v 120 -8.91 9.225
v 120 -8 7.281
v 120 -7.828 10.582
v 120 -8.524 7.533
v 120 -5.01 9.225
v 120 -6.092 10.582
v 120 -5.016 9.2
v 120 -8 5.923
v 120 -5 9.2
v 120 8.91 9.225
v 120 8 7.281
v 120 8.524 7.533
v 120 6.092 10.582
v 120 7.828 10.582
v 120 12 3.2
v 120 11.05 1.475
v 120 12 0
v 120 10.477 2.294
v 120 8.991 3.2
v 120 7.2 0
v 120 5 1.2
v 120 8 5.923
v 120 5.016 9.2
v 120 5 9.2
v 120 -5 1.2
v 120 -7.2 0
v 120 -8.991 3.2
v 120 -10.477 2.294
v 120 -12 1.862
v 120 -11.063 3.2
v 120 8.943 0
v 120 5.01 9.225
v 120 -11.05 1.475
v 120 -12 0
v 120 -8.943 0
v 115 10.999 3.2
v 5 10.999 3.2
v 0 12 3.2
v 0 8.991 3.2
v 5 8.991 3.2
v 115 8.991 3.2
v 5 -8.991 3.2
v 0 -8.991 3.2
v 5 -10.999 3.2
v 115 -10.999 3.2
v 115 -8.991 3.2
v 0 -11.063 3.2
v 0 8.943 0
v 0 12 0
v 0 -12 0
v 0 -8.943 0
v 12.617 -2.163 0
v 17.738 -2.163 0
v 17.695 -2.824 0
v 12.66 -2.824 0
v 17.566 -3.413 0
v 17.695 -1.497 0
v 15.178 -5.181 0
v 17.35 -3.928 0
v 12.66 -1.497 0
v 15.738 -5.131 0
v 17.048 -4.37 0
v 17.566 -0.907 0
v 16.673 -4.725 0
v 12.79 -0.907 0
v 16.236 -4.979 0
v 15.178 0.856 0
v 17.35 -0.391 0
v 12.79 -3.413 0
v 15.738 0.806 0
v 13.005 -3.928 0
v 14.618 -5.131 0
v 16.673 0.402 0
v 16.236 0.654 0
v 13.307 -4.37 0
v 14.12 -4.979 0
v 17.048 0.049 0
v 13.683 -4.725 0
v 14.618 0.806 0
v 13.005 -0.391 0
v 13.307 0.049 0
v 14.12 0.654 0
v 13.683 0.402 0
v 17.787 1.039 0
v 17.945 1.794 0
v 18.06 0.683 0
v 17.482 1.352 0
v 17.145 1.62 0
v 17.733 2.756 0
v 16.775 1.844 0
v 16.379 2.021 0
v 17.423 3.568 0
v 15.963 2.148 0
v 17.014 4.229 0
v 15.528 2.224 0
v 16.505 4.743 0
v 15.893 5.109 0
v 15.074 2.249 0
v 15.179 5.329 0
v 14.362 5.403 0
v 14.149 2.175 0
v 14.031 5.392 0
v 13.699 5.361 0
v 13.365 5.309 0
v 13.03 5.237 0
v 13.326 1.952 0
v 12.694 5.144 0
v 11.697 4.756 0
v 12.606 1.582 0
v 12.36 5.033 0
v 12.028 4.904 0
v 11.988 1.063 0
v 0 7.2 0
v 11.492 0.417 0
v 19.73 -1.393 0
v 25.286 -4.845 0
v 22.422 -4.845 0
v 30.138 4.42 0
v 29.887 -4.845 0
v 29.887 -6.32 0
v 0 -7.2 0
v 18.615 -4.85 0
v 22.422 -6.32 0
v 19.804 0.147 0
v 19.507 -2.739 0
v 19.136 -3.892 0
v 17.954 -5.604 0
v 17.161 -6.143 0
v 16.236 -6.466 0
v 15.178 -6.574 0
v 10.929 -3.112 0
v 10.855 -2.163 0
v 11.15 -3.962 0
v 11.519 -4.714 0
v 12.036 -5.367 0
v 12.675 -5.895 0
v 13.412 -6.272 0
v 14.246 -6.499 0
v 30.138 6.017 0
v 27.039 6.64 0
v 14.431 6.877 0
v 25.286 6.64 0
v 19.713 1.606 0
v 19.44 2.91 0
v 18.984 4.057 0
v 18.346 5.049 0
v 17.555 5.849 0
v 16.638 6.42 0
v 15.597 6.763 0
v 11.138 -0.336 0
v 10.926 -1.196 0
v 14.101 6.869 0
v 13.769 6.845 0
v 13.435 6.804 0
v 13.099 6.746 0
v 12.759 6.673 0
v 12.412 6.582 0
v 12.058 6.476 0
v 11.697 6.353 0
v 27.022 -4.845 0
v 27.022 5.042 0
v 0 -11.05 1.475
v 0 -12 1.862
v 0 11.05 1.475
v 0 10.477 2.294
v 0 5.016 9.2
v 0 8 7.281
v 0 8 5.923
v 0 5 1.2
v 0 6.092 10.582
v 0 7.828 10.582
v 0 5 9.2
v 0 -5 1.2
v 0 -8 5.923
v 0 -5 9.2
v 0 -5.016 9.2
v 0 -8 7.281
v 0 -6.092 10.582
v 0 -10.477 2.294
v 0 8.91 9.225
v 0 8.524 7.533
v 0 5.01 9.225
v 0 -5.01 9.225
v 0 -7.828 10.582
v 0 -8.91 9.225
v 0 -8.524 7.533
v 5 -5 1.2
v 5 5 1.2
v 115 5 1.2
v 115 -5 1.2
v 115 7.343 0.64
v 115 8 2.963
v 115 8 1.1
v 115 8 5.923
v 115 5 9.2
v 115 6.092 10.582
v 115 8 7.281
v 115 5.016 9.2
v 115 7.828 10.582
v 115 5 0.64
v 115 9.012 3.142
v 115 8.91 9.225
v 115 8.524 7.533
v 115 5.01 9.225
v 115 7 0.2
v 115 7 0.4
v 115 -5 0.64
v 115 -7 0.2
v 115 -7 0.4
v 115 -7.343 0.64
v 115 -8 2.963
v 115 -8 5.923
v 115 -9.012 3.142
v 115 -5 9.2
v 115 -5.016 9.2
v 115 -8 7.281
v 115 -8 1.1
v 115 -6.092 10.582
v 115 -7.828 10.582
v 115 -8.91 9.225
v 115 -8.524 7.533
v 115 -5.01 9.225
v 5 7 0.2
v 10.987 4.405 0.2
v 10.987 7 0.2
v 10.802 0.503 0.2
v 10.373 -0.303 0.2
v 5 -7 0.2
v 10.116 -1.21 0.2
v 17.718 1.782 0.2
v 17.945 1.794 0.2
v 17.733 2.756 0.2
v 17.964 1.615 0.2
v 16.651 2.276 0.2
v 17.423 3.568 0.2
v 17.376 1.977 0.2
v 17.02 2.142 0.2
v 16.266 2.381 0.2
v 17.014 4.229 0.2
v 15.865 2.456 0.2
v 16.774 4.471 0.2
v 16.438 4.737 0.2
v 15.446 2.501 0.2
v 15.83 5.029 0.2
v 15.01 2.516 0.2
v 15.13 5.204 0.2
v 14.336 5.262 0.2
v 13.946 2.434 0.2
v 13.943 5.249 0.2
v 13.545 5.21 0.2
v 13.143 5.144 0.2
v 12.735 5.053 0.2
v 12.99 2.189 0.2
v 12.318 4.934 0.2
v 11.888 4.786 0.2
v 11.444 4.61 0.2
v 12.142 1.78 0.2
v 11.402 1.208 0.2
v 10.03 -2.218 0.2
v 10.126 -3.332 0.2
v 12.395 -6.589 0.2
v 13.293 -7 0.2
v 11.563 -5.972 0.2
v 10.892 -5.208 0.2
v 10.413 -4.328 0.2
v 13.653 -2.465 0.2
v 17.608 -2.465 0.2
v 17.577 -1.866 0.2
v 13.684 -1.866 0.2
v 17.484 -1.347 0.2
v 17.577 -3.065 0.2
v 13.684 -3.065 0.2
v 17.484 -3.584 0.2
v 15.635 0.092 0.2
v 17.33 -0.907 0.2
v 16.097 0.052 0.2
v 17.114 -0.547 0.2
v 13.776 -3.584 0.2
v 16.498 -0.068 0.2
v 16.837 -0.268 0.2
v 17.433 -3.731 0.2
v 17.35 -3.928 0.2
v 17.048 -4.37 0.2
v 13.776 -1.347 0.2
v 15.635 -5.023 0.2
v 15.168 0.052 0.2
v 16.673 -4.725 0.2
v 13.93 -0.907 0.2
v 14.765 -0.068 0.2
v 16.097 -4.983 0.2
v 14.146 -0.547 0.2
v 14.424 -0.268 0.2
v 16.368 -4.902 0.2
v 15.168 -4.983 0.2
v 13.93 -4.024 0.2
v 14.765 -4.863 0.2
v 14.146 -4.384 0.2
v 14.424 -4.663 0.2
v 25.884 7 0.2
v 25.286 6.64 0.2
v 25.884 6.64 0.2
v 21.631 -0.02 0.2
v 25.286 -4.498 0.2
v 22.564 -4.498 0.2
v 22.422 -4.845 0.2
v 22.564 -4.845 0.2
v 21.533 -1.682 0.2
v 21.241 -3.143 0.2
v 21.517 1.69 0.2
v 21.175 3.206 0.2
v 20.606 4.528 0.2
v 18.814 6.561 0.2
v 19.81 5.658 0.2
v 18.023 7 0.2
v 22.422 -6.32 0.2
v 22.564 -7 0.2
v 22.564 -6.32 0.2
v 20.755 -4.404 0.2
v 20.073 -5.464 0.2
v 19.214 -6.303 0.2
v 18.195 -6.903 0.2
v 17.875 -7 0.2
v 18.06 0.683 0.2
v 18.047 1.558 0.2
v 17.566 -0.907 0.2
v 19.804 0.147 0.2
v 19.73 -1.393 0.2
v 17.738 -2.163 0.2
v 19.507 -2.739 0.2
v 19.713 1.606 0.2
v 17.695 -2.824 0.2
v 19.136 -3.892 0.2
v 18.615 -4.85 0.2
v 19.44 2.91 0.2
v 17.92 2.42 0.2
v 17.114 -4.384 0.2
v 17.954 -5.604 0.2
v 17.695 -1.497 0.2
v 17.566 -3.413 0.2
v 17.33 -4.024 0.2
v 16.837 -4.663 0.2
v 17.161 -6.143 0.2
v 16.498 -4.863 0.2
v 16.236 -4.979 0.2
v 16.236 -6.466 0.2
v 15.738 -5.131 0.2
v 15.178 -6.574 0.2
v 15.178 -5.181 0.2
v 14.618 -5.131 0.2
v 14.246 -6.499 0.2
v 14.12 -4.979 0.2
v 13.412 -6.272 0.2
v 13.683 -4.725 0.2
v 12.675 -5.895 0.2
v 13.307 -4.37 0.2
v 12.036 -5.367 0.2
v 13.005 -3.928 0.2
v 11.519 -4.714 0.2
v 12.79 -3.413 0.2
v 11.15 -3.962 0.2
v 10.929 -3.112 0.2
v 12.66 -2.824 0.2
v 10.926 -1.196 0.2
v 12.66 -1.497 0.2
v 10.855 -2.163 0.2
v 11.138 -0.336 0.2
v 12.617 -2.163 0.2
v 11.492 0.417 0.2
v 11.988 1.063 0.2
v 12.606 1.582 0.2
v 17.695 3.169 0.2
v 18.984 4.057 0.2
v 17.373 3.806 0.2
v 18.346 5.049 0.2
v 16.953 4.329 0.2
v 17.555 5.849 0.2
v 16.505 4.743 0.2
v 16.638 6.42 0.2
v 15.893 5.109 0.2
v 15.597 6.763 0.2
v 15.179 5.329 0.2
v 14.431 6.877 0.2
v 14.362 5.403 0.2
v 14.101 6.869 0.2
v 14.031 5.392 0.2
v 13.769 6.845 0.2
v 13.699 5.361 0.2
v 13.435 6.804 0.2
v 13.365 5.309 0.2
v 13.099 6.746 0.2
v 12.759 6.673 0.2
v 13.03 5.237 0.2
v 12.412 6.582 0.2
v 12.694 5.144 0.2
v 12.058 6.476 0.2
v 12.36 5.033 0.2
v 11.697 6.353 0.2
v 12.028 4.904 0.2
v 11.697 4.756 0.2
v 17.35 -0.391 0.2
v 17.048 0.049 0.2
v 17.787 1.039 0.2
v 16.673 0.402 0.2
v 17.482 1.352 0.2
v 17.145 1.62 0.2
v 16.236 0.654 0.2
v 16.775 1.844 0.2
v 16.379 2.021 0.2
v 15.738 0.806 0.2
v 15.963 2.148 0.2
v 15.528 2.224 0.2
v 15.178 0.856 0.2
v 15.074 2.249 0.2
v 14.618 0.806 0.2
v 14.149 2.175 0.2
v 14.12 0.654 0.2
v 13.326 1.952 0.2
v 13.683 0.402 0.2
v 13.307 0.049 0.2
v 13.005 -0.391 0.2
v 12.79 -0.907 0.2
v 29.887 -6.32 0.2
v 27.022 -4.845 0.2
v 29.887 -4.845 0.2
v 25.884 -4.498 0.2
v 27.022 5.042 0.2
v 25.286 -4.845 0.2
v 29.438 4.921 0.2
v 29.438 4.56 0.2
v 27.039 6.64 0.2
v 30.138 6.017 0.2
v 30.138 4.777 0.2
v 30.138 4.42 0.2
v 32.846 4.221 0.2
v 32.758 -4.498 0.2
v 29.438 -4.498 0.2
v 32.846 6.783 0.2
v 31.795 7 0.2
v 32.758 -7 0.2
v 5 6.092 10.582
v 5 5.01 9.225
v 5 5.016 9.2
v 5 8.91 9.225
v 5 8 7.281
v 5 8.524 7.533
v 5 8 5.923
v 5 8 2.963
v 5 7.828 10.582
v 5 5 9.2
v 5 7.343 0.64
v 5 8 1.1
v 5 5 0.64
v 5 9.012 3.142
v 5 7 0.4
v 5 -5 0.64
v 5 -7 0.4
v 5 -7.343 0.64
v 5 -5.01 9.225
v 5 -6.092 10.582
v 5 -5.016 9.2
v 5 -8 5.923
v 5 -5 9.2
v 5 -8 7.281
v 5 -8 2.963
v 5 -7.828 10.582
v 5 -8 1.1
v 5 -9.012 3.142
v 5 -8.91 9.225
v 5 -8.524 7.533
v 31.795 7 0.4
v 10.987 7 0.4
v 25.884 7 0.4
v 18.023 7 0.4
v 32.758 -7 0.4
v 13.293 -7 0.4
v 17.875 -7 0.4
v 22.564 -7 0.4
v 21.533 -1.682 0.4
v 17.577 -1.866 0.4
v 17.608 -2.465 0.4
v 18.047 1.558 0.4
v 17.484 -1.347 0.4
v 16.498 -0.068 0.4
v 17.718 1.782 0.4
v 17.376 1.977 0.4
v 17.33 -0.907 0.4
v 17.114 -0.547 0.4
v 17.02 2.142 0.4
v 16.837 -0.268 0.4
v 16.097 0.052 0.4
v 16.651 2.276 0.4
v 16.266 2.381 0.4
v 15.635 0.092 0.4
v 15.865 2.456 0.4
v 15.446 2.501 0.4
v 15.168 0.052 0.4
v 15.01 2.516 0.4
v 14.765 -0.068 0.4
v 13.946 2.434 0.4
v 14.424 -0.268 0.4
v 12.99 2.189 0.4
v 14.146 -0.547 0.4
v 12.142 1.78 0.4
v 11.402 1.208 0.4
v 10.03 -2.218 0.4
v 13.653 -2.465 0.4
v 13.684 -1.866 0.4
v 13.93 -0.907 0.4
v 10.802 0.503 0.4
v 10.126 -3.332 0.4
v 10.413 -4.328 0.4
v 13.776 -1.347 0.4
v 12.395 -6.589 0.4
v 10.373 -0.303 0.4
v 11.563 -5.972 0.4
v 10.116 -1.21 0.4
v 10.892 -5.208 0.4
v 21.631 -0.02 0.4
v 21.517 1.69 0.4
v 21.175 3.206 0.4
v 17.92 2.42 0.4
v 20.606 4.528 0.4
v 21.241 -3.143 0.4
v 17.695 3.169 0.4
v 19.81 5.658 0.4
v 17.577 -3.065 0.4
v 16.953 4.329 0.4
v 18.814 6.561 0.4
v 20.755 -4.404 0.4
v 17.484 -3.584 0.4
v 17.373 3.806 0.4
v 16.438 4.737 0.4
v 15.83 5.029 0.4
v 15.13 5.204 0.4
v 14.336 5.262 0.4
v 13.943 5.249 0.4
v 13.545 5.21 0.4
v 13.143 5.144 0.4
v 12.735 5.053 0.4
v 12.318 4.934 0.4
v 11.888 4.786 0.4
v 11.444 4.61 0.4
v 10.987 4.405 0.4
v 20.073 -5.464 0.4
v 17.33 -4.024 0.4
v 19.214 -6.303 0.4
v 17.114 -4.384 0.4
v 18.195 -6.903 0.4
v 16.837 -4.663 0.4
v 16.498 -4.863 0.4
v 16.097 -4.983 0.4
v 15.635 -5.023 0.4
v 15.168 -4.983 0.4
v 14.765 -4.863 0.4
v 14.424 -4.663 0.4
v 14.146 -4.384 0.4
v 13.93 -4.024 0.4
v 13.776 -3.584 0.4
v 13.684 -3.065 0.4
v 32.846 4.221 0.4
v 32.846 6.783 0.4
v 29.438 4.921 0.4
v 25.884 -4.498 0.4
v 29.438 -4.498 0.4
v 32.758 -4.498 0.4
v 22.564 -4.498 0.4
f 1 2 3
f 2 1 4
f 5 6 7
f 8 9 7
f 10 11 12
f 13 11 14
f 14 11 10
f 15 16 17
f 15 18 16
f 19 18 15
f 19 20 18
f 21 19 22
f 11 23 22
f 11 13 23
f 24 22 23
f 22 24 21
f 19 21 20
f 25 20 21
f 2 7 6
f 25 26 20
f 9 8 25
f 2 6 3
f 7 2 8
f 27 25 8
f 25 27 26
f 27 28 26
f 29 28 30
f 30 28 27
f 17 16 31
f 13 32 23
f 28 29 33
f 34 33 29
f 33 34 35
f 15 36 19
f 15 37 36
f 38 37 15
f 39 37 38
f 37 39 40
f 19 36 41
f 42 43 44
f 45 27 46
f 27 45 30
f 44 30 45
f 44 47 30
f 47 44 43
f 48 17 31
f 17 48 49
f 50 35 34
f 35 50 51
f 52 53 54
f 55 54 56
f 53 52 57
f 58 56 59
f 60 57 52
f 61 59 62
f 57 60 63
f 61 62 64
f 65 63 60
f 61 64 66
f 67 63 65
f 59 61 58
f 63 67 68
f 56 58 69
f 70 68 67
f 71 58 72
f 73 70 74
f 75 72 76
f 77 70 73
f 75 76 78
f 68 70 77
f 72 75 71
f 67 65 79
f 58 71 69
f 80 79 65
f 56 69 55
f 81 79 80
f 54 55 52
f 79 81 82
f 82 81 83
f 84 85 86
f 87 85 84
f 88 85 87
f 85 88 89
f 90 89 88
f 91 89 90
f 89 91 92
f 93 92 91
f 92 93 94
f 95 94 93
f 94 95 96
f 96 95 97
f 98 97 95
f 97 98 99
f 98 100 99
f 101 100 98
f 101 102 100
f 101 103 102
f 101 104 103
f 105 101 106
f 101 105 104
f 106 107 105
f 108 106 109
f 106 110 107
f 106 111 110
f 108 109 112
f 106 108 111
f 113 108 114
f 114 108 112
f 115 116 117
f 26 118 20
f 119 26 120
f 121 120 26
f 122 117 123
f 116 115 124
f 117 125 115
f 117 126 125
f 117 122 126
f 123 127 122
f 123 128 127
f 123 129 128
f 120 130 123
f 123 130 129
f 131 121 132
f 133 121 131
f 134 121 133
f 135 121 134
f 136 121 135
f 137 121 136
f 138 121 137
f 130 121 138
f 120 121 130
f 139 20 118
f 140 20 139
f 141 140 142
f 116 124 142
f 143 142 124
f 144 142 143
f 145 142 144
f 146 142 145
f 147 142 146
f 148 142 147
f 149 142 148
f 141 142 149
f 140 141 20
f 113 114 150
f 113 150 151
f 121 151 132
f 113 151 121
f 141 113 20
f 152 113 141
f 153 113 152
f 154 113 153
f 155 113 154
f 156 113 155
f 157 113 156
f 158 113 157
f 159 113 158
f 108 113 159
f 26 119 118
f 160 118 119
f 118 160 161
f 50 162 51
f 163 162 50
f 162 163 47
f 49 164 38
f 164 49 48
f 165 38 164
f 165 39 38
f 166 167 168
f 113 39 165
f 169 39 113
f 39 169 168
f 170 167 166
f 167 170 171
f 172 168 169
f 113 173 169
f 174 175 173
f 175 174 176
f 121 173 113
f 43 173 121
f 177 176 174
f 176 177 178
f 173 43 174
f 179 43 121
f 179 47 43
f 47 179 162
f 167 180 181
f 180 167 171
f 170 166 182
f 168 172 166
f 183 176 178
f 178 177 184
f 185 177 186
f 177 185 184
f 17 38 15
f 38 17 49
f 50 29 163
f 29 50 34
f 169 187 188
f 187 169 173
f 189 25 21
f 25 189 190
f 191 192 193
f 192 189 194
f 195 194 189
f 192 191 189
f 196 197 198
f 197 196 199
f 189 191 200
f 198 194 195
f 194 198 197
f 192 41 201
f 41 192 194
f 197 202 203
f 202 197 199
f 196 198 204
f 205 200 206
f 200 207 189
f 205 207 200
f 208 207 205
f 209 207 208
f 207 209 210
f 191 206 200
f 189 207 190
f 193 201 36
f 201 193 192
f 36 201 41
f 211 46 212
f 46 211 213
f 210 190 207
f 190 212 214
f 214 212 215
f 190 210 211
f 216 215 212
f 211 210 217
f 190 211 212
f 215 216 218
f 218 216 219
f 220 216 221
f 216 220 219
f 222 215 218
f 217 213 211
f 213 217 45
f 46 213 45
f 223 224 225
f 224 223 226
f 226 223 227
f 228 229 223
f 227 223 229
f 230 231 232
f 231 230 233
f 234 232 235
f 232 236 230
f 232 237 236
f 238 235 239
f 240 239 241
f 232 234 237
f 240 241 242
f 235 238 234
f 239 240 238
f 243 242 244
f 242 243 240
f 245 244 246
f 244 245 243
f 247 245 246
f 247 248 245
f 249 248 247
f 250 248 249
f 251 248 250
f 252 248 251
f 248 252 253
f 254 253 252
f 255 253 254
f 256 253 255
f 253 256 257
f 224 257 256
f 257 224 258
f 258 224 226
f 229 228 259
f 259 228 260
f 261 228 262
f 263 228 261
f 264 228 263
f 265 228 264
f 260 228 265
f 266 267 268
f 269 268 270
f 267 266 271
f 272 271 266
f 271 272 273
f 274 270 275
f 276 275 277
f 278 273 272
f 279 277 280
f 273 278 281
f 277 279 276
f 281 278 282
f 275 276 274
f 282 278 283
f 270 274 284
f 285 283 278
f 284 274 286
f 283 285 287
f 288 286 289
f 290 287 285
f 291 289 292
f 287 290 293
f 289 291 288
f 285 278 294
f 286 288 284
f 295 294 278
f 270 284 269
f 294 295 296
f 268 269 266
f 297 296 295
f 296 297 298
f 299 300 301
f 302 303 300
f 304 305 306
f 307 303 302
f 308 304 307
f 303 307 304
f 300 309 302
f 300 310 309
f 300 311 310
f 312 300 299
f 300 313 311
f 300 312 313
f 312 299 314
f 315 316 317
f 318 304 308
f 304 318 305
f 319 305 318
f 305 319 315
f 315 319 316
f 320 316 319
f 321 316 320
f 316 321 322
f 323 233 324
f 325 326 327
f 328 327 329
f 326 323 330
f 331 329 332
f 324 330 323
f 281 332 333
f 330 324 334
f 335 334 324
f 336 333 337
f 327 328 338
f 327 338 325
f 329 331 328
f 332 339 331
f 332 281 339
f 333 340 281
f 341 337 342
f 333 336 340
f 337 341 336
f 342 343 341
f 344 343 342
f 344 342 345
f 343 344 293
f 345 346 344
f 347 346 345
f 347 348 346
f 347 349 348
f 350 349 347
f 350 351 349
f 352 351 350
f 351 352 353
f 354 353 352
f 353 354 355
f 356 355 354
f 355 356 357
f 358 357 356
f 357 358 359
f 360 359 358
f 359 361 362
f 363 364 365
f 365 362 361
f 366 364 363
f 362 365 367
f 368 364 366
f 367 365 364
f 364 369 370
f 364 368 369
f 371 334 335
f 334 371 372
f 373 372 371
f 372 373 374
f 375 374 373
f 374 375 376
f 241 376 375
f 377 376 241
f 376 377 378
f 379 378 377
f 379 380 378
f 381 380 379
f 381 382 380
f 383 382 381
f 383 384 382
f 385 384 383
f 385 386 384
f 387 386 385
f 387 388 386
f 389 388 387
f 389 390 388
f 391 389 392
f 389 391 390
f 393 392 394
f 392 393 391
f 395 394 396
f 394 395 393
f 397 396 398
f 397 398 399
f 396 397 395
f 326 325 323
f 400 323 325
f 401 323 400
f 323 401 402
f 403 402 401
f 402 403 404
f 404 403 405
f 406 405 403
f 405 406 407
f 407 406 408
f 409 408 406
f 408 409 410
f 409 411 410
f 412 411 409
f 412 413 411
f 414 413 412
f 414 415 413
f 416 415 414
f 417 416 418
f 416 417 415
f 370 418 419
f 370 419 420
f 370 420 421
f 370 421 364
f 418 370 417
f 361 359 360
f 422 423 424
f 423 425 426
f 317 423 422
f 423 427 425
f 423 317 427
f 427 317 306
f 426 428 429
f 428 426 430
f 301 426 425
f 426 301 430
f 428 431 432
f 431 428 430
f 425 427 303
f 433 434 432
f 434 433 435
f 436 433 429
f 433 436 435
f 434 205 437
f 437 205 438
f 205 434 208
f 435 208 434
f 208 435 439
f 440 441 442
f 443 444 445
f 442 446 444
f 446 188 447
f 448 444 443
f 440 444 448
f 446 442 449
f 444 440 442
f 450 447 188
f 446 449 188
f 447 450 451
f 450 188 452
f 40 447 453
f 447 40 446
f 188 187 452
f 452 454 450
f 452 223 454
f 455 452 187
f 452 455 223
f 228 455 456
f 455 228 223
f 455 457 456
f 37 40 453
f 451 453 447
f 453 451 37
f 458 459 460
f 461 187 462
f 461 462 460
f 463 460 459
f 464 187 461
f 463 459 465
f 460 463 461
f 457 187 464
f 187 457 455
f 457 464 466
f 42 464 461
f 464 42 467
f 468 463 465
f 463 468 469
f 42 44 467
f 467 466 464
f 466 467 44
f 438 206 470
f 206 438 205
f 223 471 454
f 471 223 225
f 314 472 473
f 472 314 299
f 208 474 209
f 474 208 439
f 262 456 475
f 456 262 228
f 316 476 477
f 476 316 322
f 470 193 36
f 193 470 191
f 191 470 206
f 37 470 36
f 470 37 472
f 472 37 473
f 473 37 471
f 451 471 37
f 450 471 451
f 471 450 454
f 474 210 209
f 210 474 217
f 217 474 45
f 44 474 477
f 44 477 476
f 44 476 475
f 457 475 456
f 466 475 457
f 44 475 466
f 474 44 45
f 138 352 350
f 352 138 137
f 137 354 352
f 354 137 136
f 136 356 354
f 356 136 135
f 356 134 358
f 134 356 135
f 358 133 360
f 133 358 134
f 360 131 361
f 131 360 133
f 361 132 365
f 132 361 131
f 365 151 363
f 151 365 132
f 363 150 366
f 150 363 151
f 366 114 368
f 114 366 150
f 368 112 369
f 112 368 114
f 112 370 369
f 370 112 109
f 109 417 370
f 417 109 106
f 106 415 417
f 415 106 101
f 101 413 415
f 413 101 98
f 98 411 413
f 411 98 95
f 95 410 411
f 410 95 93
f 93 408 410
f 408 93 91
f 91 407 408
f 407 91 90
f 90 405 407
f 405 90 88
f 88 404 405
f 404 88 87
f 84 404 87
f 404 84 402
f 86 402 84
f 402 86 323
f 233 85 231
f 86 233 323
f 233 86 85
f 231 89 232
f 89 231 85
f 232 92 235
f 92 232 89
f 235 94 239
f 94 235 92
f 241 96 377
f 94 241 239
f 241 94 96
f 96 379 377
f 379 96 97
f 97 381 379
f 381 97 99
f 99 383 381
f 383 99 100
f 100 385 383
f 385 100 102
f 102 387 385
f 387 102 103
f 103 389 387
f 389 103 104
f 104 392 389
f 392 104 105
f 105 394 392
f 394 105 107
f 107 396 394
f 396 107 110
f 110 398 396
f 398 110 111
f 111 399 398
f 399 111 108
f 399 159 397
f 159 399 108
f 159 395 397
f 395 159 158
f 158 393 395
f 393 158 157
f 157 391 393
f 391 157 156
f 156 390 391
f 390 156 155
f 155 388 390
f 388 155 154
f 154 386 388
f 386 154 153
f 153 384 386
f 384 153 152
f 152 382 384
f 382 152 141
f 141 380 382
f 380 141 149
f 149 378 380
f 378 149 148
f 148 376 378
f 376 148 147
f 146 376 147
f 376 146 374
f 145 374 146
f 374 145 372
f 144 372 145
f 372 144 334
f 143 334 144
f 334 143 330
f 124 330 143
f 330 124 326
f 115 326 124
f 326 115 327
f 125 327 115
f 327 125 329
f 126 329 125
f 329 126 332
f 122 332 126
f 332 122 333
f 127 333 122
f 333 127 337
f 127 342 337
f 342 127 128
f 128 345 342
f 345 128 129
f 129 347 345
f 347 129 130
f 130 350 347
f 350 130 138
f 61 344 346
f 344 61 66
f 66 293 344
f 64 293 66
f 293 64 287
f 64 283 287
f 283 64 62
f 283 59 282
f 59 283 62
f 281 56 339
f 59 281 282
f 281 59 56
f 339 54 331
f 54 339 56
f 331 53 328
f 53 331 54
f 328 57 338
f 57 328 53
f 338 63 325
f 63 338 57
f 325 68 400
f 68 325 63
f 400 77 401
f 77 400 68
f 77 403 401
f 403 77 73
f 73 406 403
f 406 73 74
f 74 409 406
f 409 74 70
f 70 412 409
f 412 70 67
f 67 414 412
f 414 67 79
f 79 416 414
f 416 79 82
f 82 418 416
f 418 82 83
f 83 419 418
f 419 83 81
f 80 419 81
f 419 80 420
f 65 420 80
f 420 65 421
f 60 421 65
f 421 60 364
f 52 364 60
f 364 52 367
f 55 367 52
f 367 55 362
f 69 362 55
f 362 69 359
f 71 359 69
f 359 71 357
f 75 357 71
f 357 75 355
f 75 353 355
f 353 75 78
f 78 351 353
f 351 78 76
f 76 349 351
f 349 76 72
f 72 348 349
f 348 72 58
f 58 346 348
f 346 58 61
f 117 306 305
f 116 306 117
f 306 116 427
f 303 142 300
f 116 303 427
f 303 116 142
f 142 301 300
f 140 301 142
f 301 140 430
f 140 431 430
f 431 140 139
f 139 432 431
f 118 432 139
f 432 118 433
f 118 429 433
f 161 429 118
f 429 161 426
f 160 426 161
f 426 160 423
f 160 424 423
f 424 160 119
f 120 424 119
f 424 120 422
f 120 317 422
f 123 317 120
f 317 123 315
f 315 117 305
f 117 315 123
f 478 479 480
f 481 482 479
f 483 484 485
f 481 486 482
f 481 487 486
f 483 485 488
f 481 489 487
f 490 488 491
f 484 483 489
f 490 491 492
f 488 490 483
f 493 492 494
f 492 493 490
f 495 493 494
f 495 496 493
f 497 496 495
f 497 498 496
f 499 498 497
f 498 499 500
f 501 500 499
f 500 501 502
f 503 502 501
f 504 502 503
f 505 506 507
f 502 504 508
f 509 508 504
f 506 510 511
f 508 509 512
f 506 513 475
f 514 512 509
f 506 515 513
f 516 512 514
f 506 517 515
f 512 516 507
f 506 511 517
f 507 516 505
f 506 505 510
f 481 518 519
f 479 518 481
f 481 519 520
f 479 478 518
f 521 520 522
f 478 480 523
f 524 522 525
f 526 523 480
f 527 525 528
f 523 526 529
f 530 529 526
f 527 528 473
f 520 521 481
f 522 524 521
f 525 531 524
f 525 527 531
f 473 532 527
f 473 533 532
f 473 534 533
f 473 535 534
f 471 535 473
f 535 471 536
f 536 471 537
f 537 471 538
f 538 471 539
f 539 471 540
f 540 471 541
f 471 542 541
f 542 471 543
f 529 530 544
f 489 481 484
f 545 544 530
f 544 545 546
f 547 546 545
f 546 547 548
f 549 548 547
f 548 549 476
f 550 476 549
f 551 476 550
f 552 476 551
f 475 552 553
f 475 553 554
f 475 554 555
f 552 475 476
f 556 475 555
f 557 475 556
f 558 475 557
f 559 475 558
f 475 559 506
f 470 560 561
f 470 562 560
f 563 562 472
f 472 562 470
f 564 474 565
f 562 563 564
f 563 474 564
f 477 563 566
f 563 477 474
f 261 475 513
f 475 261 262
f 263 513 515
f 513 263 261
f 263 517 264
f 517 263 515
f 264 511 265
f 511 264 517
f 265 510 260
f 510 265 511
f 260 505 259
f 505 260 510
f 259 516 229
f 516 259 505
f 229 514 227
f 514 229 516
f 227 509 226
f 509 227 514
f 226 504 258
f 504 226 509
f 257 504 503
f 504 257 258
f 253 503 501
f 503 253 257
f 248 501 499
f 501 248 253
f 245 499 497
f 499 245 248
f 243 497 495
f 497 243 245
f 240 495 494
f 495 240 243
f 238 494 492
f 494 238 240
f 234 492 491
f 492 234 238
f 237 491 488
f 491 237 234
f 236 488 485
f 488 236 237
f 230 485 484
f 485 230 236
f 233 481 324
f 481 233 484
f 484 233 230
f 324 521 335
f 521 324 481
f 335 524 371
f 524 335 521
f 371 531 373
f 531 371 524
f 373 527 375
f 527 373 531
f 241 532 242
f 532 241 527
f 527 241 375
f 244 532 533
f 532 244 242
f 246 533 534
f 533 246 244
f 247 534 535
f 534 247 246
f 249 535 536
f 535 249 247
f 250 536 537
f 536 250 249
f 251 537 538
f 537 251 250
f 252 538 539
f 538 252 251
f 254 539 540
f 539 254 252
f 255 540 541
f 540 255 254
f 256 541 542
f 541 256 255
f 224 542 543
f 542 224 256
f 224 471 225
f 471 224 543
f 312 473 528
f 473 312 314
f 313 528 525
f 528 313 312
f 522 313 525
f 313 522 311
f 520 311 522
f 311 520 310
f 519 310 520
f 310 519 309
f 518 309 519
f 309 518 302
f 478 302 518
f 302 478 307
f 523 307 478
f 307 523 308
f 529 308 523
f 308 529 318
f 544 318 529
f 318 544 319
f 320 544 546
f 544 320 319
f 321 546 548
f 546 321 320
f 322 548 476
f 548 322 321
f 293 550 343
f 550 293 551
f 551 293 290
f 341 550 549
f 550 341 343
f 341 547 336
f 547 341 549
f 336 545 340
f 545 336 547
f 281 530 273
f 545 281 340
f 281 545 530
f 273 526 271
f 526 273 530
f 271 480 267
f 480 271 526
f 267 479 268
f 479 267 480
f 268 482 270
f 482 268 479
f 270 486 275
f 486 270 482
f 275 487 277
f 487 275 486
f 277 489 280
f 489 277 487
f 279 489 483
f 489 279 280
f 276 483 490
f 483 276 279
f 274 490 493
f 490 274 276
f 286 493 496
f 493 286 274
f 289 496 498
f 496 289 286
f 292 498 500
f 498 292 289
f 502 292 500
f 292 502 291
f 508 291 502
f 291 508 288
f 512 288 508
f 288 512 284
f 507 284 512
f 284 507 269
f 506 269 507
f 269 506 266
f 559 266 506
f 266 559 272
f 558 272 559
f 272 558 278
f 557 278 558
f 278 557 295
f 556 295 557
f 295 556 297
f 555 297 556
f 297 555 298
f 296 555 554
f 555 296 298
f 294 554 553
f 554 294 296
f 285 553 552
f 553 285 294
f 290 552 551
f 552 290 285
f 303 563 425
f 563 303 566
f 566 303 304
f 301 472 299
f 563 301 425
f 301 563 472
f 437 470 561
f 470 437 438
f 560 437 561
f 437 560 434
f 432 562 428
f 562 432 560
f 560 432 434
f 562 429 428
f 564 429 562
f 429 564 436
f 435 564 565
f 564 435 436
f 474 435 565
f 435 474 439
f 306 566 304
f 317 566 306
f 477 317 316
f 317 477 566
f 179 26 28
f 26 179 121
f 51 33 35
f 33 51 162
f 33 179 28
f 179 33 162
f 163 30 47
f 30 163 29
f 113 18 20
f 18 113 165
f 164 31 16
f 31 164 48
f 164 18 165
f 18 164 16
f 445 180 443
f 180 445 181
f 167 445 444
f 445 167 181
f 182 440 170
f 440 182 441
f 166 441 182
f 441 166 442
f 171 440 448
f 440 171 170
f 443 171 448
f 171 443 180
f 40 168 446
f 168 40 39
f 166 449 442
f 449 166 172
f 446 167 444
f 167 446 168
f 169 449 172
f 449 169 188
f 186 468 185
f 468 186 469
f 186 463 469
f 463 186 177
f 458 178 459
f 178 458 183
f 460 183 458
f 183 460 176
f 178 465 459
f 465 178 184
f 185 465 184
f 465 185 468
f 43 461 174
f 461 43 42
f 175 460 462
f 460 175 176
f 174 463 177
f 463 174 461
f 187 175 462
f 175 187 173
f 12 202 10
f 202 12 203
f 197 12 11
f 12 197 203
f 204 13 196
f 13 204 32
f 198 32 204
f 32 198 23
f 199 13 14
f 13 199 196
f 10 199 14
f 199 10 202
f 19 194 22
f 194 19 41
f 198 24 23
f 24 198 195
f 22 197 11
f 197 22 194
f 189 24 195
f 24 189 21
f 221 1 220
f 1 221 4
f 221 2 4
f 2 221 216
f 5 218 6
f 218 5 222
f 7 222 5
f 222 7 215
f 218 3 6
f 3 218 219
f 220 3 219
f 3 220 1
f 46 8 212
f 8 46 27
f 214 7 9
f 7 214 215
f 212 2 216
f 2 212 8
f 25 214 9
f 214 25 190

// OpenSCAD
// Thingiverse link: https://www.thingiverse.com/thing:7193444
// author: Shawn Featherly
// v0.2

// width of the panel in mm. This should be a multiple of 60. Because almost all wire shelves have a 60mm frequency for their zig-zag brace.
LabelWidth = 120; // [60:300]

// inner height of the shelf brim that the 4 pegs will snap inside in mm. minimum usable size is 6.5mm.
ClampHeight = 16;

/* [Hidden] */
// Remaining variables are hidden from Thingiverse

GapForPaper = 1; // mm
DepthForPaper = 4;
LabelDepth = 3.2;
LabelHeightOverClamp = 4;
LabelHeight = ClampHeight + LabelHeightOverClamp + LabelHeightOverClamp;

PinHeight = 6;
PinWidth = 5;
PinRadius = 2;

difference()
{
  LabelPanel();
  PaperGap();
}

FourPins();

module LabelPanel()
{
  widthInsidePins = LabelWidth-2*PinWidth;

  difference()
  {
    translate([0, -LabelHeight/2, 0])
      cube([LabelWidth,LabelHeight,LabelDepth]);

    // Cut away just enough between pin gap to give pins some spring
    translate([-1, -ClampHeight/2,1.2])
      cube([LabelWidth+2,ClampHeight,LabelDepth]);

    // center is single layer of filament, used only for bed adhesion
    translate([PinWidth, -(ClampHeight-PinRadius)/2, 0.2]) // 0.2 is typical layer of Prusa M4
      cube([widthInsidePins,ClampHeight-PinRadius,LabelDepth]);

    // slope above PaperGap()
    translate([PinWidth,(ClampHeight-PinRadius)/2,.4])
      rotate([35,0,0])
        cube([widthInsidePins,DepthForPaper+LabelHeightOverClamp,LabelDepth]);    
    translate([PinWidth,-(ClampHeight-PinRadius)/2,.4])
      rotate([-35,0,0])
        translate([0,-(DepthForPaper+LabelHeightOverClamp),0])
          cube([widthInsidePins,DepthForPaper+LabelHeightOverClamp,LabelDepth]);

    // Label part by engraving its ClampHeight
    translate([2*PinWidth,0,-0.2])
      scale([-1,1,1]) //mirror
        linear_extrude(height=.4, convexity=4)
          text
          (
            str(ClampHeight), 
            size=0.8*ClampHeight,
            font="Source Code Pro:style=ExtraLight",
            halign="right",
            valign="center"
          );
  }

  // Back panel engraving to ensure 0's don't lose their center
  // NOTE: This 2-layer text is a workaround for OpenSCAD not coming with stencil fonts
  translate([2*PinWidth+(.04*ClampHeight),0,0.2]) // (.04*C...) - shifts text to center it ontop of engraving
    scale([-1,1,1]) //mirror
      linear_extrude(height=.2, convexity=4)
        text
        (
          str(ClampHeight), 
          size=0.9*ClampHeight,
          spacing=.9, // spacing between letters.
          font="Source Code Pro:style=Bold",
          halign="right", // right is needed because "halign=center" only centers spacing=1
          valign="center"
        );
}

module PaperGap()
{
  translate([0,LabelHeight/2-1.2*DepthForPaper,0])
    rotate([35,0,0])
      translate([-1,0,-GapForPaper])
      {
        // paper gap
        cube([LabelWidth+2,DepthForPaper,GapForPaper]);

        // commented out to keep label flush with top of wire shelf
        // trim non-functional corner
        //translate([0,DepthForPaper+1,-(LabelDepth-GapForPaper)/2])
        //  cube([LabelWidth+2,LabelHeightOverClamp,LabelDepth]);
      }

  translate([0,-(LabelHeight/2-1.2*DepthForPaper),0])
    rotate([-35,0,0])
      translate([-1,-DepthForPaper,-GapForPaper])
      {
        // paper gap
        cube([LabelWidth+2,DepthForPaper,GapForPaper]);

        // trim non-functional corner
        translate([0,-DepthForPaper-1,-(LabelDepth-GapForPaper)/2])
          cube([LabelWidth+2,LabelHeightOverClamp,LabelDepth]);
      }
}

module FourPins()
{
  translate([PinWidth/2, ClampHeight / 2, 0])
    Pin();
  translate([PinWidth/2, -ClampHeight / 2, 0])
    rotate([0,0,180])
      Pin();

  translate([LabelWidth-PinWidth/2, ClampHeight / 2, 0])
    Pin();
  translate([LabelWidth-PinWidth/2, -ClampHeight / 2, 0])
    rotate([0,0,180])
      Pin();
}

module Pin()
{
  translate([-PinWidth/2,-1.5*PinRadius,LabelDepth])
  {
    translate([0, 0, -.8 * LabelDepth])
      cube([PinWidth, 1.5*PinRadius, PinHeight + .8 * LabelDepth]);

    translate([0, 0.98 * 2, 0.93 * PinHeight]) // 0.98 & 0.93 align the 7-segment of the circle with the cube
    {
      rotate([0,90,0])
      {
        cylinder(PinWidth, PinRadius, PinRadius);

        // wedge below cylinder
        rotate_extrude(angle=20, convexity=10)
          square([PinHeight, PinWidth]);
      }
    }
  }
}
